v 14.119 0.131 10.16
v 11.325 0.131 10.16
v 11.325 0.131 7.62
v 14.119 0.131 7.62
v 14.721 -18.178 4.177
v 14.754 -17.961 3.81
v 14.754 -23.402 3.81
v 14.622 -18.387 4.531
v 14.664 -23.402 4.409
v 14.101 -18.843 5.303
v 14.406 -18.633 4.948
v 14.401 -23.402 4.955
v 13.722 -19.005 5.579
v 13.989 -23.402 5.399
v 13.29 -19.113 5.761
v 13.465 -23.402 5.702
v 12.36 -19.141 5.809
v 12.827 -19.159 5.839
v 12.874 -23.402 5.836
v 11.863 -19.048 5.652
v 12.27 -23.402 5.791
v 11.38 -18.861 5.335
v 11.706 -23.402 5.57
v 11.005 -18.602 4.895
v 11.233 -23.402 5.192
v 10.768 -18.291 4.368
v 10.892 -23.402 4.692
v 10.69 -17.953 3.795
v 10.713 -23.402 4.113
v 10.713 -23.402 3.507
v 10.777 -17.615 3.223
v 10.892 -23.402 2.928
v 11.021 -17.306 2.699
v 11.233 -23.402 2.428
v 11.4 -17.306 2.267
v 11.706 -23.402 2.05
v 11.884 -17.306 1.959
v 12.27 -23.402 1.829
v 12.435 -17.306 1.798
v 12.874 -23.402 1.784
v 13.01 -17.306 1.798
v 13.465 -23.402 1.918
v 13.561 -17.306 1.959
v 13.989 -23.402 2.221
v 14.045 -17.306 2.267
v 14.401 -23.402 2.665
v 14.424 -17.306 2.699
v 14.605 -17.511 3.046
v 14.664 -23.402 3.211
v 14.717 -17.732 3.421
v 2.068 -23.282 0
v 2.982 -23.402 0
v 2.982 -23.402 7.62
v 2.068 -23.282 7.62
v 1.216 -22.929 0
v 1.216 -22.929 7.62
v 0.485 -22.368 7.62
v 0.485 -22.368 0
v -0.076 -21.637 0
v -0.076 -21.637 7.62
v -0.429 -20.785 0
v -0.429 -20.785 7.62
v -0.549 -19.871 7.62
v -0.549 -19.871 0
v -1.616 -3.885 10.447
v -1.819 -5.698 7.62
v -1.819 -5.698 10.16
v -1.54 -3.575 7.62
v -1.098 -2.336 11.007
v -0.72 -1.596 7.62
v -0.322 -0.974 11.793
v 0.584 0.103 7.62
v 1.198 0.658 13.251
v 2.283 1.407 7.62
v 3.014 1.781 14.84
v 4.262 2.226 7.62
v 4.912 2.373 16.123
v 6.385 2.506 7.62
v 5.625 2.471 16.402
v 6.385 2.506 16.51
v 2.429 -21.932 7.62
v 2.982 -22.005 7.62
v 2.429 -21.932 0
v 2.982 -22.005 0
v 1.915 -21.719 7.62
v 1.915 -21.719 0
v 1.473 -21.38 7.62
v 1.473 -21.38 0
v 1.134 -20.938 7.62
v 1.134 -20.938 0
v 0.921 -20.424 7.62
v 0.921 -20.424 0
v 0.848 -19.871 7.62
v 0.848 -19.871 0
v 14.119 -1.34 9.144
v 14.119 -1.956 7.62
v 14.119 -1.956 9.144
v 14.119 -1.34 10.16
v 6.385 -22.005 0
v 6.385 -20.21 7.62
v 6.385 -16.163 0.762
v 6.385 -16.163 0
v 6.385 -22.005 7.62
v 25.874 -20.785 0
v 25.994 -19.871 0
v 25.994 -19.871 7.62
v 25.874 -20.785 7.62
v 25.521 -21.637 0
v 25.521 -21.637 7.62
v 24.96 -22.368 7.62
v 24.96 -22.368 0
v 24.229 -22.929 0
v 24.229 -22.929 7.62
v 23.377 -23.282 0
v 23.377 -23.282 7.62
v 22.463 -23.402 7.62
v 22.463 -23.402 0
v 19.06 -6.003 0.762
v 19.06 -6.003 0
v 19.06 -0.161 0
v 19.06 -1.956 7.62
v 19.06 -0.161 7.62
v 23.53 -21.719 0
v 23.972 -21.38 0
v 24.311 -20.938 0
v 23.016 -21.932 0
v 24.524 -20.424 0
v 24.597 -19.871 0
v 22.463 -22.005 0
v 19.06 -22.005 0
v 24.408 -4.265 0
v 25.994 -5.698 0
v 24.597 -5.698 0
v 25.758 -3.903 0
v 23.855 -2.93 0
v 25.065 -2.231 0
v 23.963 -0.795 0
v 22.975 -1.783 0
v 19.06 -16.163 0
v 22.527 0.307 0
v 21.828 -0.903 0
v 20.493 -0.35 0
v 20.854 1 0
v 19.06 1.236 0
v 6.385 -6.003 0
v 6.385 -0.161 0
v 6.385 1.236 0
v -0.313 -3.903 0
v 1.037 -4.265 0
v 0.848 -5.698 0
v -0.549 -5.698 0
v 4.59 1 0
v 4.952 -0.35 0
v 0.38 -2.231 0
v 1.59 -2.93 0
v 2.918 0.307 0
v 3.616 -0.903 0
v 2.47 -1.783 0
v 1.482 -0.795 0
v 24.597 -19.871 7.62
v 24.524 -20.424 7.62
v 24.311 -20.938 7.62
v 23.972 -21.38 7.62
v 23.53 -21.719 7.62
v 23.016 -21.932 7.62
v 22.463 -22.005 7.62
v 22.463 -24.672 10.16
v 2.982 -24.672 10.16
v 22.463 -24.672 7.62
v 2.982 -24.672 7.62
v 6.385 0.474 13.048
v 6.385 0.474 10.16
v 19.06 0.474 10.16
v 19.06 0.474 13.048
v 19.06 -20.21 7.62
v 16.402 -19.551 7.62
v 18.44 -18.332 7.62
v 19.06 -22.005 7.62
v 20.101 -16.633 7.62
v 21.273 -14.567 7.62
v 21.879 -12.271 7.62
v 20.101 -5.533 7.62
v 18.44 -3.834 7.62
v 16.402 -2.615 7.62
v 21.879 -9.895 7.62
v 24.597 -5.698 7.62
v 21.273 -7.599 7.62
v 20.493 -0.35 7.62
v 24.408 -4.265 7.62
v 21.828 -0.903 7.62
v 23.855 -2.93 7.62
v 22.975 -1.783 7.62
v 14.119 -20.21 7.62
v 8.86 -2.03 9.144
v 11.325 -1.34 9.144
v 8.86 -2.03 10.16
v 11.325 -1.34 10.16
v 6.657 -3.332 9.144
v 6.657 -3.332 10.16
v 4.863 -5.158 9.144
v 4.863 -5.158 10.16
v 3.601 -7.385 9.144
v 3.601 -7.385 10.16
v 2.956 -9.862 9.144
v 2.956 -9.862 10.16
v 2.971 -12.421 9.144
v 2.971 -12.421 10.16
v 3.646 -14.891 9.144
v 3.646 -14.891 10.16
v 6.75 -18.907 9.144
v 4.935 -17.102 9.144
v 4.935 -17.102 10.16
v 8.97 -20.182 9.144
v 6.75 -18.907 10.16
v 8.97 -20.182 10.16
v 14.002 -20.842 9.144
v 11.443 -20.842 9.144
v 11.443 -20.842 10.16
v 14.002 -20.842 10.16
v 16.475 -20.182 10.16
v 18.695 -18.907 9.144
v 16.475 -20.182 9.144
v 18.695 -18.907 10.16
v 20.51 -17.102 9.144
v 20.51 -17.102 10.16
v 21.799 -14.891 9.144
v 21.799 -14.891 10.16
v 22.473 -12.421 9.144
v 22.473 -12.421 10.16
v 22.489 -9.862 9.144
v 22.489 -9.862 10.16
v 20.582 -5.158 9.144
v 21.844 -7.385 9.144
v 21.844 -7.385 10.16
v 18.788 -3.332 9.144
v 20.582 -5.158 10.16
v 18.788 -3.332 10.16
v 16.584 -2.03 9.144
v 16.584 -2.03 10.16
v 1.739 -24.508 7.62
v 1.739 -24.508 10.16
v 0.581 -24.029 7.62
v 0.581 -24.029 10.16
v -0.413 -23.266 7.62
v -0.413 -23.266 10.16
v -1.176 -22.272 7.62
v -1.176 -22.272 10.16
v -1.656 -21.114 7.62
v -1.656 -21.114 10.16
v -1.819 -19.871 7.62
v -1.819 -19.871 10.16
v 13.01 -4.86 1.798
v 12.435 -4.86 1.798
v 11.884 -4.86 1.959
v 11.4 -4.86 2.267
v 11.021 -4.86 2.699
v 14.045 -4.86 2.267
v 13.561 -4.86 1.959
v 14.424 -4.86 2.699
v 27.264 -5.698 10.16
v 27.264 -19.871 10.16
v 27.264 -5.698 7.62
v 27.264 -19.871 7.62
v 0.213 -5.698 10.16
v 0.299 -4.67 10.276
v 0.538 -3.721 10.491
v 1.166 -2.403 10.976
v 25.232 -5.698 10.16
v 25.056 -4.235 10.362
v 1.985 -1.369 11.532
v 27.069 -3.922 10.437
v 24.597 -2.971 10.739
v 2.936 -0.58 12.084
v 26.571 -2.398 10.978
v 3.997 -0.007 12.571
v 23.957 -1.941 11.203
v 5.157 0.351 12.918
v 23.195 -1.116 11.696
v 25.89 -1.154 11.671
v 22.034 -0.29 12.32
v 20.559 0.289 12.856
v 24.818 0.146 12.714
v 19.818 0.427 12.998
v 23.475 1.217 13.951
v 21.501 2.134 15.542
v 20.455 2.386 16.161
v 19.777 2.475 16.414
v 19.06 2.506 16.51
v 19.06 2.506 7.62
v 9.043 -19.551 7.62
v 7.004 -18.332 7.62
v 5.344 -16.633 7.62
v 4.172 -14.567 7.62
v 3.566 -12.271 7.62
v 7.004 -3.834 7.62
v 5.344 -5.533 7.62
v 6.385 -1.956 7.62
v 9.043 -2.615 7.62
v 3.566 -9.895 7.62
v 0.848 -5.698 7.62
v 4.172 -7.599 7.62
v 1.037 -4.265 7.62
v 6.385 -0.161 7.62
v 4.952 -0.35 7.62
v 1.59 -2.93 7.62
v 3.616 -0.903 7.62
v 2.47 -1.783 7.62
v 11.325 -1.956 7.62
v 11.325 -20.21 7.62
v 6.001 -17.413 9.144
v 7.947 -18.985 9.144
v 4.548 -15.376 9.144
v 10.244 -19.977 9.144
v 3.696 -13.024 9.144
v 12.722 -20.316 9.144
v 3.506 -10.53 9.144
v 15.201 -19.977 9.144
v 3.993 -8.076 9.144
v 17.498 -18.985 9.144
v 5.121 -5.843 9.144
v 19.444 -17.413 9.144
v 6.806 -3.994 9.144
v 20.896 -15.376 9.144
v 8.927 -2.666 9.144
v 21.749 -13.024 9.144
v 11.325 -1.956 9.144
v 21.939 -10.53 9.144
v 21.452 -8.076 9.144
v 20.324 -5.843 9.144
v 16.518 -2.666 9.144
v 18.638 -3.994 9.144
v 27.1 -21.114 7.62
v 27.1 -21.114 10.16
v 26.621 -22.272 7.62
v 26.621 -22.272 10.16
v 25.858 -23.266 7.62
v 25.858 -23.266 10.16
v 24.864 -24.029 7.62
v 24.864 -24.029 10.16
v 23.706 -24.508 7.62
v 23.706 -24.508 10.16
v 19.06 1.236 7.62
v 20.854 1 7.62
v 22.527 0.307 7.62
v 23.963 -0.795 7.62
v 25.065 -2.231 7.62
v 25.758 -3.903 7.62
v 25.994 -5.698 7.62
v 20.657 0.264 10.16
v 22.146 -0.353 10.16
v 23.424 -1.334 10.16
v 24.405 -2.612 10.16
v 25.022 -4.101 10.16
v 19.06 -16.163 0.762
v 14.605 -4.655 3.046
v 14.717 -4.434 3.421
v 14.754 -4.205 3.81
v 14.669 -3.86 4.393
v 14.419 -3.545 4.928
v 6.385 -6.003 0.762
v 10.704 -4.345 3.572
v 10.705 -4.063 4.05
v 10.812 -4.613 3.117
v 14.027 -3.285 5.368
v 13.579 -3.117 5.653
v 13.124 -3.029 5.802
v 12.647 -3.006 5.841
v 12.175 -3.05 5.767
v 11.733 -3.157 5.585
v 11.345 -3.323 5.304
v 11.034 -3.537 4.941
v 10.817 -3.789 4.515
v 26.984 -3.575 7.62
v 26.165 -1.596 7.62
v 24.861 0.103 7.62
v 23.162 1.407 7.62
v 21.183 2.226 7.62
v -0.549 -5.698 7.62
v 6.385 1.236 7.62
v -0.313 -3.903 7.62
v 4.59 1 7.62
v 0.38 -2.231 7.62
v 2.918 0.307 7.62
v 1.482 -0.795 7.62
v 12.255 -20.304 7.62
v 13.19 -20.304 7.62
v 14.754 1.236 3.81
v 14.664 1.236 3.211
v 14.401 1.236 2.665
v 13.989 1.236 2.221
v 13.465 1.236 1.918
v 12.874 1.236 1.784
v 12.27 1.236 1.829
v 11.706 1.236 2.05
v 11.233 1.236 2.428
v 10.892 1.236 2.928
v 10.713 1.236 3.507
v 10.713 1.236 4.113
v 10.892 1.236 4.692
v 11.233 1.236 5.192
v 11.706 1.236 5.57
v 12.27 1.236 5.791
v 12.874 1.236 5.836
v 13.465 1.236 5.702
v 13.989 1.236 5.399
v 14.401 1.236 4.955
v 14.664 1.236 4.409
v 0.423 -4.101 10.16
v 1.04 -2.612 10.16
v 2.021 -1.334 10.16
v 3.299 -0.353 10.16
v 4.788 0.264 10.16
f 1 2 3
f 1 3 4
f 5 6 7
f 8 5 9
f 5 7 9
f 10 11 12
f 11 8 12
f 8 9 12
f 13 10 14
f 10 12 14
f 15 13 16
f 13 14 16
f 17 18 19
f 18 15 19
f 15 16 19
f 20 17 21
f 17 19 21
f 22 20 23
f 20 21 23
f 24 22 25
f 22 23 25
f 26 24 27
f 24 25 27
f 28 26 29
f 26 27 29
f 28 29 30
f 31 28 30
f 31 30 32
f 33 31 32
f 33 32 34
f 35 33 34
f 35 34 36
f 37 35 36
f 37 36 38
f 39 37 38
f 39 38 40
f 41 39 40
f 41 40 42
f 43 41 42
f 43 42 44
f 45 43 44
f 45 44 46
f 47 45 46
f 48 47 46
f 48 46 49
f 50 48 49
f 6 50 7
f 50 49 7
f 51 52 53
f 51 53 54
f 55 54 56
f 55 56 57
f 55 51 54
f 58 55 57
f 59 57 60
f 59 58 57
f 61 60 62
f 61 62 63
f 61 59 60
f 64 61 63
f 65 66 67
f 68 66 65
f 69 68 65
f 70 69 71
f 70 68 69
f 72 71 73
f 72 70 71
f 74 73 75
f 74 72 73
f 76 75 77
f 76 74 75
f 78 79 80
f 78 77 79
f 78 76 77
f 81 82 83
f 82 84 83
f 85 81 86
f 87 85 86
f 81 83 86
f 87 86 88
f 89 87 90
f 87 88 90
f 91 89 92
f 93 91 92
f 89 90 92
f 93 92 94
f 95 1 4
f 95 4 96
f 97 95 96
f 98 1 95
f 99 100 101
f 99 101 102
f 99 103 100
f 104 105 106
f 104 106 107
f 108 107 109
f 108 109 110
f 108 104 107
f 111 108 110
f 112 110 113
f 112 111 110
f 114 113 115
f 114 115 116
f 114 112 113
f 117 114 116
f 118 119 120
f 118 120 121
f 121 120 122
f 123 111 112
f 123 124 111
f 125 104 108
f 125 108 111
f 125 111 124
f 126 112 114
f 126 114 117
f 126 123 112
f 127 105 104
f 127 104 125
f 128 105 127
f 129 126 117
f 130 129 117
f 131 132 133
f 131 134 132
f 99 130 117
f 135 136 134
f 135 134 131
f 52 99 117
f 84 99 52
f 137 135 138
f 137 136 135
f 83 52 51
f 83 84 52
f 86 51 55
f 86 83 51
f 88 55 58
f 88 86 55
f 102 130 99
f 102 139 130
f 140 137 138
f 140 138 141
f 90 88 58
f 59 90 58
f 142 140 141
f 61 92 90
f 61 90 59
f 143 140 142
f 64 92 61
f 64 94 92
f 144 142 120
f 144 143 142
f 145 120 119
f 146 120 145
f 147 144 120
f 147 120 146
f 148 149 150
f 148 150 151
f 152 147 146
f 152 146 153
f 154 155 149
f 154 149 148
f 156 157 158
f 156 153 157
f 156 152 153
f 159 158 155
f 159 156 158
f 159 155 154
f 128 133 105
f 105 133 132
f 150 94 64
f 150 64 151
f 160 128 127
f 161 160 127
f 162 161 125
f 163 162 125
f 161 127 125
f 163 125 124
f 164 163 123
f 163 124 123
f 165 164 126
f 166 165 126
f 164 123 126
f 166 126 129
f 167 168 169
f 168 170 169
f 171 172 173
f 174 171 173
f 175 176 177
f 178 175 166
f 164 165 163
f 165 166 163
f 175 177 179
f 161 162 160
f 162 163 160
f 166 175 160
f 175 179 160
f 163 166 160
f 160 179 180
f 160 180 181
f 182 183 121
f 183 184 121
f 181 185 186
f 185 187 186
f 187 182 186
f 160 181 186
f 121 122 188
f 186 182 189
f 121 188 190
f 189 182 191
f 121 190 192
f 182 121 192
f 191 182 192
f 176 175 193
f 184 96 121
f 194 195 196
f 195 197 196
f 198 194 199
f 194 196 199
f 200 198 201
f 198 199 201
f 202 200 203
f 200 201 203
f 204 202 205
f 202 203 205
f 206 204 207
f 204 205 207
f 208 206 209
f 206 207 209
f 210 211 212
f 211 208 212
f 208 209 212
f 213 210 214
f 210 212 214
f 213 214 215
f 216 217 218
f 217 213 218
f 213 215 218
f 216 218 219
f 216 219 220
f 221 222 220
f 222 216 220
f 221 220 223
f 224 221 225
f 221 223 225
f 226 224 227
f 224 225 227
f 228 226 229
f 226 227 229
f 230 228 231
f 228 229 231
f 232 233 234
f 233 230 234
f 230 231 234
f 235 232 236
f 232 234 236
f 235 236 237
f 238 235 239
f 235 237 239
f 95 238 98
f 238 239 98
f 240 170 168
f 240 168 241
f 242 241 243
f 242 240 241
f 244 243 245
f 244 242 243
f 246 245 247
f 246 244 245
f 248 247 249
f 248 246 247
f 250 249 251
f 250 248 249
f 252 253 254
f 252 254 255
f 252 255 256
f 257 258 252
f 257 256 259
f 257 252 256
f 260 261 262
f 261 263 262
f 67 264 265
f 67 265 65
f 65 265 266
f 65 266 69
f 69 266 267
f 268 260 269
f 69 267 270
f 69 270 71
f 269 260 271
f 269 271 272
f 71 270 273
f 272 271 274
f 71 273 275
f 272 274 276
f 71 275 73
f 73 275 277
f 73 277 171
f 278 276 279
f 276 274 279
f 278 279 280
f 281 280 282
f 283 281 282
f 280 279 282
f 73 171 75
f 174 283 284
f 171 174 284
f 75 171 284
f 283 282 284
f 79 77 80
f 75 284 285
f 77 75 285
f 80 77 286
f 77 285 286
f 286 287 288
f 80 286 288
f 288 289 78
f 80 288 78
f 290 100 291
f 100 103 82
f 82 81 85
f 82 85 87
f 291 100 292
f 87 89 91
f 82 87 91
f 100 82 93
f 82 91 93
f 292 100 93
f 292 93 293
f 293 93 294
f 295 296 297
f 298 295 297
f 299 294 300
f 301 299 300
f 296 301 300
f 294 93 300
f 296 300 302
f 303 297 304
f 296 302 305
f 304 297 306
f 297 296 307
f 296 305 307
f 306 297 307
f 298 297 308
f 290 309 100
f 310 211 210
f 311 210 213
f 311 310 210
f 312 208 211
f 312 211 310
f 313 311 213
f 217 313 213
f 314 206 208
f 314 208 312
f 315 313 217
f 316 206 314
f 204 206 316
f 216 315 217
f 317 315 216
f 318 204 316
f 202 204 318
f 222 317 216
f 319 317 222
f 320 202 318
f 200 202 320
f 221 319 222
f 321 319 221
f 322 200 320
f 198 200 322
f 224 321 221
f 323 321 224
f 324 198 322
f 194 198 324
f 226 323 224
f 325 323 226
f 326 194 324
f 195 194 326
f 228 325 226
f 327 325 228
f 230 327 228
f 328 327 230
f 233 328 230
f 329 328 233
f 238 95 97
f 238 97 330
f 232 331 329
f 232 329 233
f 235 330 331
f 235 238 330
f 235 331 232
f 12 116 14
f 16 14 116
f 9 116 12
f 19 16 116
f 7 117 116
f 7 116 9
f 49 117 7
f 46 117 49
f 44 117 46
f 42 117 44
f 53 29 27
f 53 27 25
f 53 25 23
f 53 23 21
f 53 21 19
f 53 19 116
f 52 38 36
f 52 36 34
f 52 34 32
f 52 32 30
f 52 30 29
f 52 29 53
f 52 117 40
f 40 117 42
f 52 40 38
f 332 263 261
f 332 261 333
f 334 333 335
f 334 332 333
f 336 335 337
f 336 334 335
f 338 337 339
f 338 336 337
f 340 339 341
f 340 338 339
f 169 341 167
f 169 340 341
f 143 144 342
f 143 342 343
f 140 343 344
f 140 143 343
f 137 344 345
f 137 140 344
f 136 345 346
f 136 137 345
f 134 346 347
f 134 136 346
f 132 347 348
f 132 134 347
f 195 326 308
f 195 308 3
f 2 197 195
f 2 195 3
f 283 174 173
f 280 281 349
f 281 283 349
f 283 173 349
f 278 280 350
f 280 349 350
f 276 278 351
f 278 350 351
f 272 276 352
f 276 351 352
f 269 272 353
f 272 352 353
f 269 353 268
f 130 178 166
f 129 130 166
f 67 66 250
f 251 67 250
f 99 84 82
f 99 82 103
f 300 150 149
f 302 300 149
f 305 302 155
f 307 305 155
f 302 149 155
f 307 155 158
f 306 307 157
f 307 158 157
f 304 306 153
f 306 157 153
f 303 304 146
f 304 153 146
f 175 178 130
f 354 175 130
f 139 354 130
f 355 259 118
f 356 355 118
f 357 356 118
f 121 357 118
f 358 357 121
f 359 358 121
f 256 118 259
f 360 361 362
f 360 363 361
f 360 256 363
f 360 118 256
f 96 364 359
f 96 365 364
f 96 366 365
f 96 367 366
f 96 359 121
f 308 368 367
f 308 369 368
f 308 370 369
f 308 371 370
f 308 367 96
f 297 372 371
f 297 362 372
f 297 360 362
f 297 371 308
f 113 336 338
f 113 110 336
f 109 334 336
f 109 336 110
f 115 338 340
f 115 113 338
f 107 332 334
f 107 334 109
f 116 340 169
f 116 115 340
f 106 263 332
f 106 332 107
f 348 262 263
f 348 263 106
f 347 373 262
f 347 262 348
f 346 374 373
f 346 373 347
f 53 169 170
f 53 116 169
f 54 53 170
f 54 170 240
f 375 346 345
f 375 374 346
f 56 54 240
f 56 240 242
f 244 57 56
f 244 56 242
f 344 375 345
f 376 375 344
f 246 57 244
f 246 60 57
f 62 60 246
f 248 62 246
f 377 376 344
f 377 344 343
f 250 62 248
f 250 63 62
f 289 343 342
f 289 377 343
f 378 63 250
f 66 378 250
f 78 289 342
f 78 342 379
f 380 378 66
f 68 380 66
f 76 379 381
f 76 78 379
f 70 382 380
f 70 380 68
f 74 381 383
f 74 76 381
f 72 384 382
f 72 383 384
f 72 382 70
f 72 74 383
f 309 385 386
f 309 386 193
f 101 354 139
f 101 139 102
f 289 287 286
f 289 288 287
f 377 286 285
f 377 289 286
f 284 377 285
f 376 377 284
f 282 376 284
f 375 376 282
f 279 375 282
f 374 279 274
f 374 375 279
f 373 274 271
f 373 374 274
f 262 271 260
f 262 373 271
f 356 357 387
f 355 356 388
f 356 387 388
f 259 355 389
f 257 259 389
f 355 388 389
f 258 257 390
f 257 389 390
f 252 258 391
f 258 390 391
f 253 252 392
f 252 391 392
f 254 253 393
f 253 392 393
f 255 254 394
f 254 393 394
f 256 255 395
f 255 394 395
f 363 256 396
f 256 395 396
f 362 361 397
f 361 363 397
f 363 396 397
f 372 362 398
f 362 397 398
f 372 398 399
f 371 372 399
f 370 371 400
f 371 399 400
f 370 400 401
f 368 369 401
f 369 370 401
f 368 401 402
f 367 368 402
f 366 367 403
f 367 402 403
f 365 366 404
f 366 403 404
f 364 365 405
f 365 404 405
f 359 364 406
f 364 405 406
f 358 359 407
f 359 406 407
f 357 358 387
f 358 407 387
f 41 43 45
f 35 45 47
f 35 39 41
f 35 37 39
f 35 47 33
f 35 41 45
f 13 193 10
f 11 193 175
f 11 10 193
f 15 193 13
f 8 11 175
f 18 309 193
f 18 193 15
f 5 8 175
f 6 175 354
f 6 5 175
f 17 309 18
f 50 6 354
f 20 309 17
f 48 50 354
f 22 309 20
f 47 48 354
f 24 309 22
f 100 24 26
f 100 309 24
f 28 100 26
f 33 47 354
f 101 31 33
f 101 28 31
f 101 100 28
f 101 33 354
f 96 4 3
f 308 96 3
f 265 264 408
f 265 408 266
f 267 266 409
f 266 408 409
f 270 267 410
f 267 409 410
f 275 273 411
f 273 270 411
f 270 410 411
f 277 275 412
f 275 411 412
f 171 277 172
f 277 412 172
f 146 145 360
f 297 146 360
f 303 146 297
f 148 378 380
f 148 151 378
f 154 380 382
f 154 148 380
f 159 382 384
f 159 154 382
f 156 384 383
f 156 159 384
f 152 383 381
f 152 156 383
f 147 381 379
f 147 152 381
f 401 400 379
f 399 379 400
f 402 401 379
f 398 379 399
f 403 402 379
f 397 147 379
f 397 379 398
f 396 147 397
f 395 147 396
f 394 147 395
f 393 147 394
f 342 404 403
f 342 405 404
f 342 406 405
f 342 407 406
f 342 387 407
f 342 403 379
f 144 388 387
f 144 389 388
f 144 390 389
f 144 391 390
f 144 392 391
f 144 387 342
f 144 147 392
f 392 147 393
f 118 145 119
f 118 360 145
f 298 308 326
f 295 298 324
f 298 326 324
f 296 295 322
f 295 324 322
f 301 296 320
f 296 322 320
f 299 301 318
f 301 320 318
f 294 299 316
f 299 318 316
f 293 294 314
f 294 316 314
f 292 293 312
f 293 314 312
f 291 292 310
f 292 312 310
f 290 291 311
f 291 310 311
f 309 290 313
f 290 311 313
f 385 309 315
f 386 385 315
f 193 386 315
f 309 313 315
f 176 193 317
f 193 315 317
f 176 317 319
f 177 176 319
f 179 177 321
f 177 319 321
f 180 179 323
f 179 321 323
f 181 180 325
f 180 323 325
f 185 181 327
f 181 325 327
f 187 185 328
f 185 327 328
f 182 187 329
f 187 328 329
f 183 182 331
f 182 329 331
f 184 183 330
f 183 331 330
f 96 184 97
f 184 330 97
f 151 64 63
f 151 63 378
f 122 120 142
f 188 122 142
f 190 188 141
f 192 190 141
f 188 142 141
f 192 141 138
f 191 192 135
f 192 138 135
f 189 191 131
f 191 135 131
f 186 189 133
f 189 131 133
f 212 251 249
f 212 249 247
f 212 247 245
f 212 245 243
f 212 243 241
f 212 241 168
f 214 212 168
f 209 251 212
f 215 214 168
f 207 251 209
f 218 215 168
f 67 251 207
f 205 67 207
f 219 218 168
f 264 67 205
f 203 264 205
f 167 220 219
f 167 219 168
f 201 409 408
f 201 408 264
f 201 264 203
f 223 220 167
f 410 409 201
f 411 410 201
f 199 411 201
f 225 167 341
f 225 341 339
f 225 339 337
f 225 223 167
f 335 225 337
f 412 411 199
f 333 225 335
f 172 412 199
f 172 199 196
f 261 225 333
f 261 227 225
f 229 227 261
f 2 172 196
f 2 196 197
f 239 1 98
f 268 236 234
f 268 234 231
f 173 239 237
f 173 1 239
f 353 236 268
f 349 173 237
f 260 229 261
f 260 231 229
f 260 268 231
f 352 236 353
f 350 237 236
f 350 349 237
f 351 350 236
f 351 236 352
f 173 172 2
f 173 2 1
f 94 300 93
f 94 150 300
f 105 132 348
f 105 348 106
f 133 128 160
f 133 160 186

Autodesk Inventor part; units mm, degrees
ref_plane "XZ Plane" through (0, 0, 0) normal (0, 1, 0) x (-1, 0, 0)
ref_plane "XY Plane" through (0, 0, 0) normal (0, 0, 1) x (1, 0, 0)
sketch "Sketch2" plane through (0, 0, 0) normal (0, 0, 1) x (1, 0, 0)
  line L0 (25.1049, -5.6982) -> (25.1049, -19.8714) projected
  arc A0 (22.4633, -22.513) -> (25.1049, -19.8714) centre (22.4633, -19.8714) ccw projected
  line L1 (22.4633, -22.513) -> (2.9815, -22.513) projected
  arc A1 (0.3399, -19.8714) -> (2.9815, -22.513) centre (2.9815, -19.8714) ccw projected
  line L2 (0.3399, -19.8714) -> (0.3399, -5.6982) projected
  arc A2 (6.3851, 0.347) -> (0.3399, -5.6982) centre (6.3851, -5.6982) ccw projected
  line L3 (6.3851, 0.347) -> (19.0597, 0.347) projected
  arc A3 (25.1049, -5.6982) -> (19.0597, 0.347) centre (19.0597, -5.6982) ccw projected
  line L4 (19.0597, 2.506) -> (6.3851, 2.506) projected
  arc A4 (6.3851, 2.506) -> (-1.8191, -5.6982) centre (6.3851, -5.6982) ccw projected
  line L5 (-1.8191, -5.6982) -> (-1.8191, -19.8714) projected
  arc A5 (-1.8191, -19.8714) -> (2.9815, -24.672) centre (2.9815, -19.8714) ccw projected
  line L6 (2.9815, -24.672) -> (22.4633, -24.672) projected
  arc A6 (22.4633, -24.672) -> (27.2639, -19.8714) centre (22.4633, -19.8714) ccw projected
  line L7 (27.2639, -19.8714) -> (27.2639, -5.6982) projected
  arc A7 (27.2639, -5.6982) -> (19.0597, 2.506) centre (19.0597, -5.6982) ccw projected
  line L8 (19.0597, -0.923) -> (6.3851, -0.923)
  arc A8 (6.3851, -0.923) -> (1.6099, -5.6982) centre (6.3851, -5.6982) ccw
  line L9 (1.6099, -5.6982) -> (1.6099, -19.8714)
  arc A9 (1.6099, -19.8714) -> (2.9815, -21.243) centre (2.9815, -19.8714) ccw
  line L10 (2.9815, -21.243) -> (22.4633, -21.243)
  arc A10 (22.4633, -21.243) -> (23.8349, -19.8714) centre (22.4633, -19.8714) ccw
  line L11 (23.8349, -19.8714) -> (23.8349, -5.6982)
  arc A11 (23.8349, -5.6982) -> (19.0597, -0.923) centre (19.0597, -5.6982) ccw
  point P0 (0, 0)
  dimension "d30" = 1.27
extrude "Extrusion1" add sketch "Sketch2" along normal blind 10.16 contours A7 L7 A6 L6 A5 L5 A4 L4
sketch "Sketch6" plane through (0, 0, 10.16) normal (0, 0, 1) x (1, 0, 0)
  arc A0 (22.4633, -22.513) -> (25.1049, -19.8714) centre (22.4633, -19.8714) ccw projected
  line L0 (22.4633, -22.513) -> (2.9815, -22.513) projected
  arc A1 (0.3399, -19.8714) -> (2.9815, -22.513) centre (2.9815, -19.8714) ccw projected
  line L1 (0.3399, -19.8714) -> (0.3399, -5.6982) projected
  arc A2 (6.3851, 0.347) -> (0.3399, -5.6982) centre (6.3851, -5.6982) ccw projected
  line L2 (6.3851, 0.347) -> (19.0597, 0.347) projected
  arc A3 (25.1049, -5.6982) -> (19.0597, 0.347) centre (19.0597, -5.6982) ccw projected
  line L3 (25.1049, -5.6982) -> (25.1049, -19.8714) projected
  line L4 (19.0597, 2.506) -> (6.3851, 2.506) projected
  arc A4 (6.3851, 2.506) -> (-1.8191, -5.6982) centre (6.3851, -5.6982) ccw projected
  line L5 (-1.8191, -5.6982) -> (-1.8191, -19.8714) projected
  arc A5 (-1.8191, -19.8714) -> (2.9815, -24.672) centre (2.9815, -19.8714) ccw projected
  line L6 (2.9815, -24.672) -> (22.4633, -24.672) projected
  arc A6 (22.4633, -24.672) -> (27.2639, -19.8714) centre (22.4633, -19.8714) ccw projected
  line L7 (27.2639, -19.8714) -> (27.2639, -5.6982) projected
  arc A7 (27.2639, -5.6982) -> (19.0597, 2.506) centre (19.0597, -5.6982) ccw projected
  point P0 (0, 0)
extrude "Extrusion2" add sketch "Sketch6" against normal blind 2.54 contours L0 A1 L1 A2 L2 A3 L3 A0
sketch "Sketch7" plane through (0, 0, 10.16) normal (0, 0, 1) x (1, 0, 0)
  circle A0 centre (12.7224, -11.083) radius 9.2329
  line L0 (27.2639, -19.8714) -> (27.2639, -5.6982) construction
  line L1 (19.0597, 2.506) -> (6.3851, 2.506) construction
  line L2 (2.9815, -24.672) -> (22.4633, -24.672) construction
  line L3 (-1.8191, -5.6982) -> (-1.8191, -19.8714) construction
  line L4 (10.7523, 2.506) -> (10.7523, -24.672) construction
  line L5 (-1.8191, -7.0342) -> (27.2639, -7.0342) construction
  point P0 (0, 0)
  point P1 (12.7224, -7.0342)
  point P2 (10.7523, -11.083)
  dimension "d8" = 18.4658
extrude "Extrusion3" cut sketch "Sketch7" against normal up to next
sketch "Sketch8" plane through (0, 0, 10.16) normal (0, 0, 1) x (1, 0, 0)
  circle A0 centre (12.7224, -11.083) radius 9.2329 projected
  circle A1 centre (12.7224, -11.083) radius 9.8425
  point P0 (0, 0)
  dimension "d16" = 19.685
extrude "Extrusion4" cut sketch "Sketch8" against normal blind 1.016
sketch "Sketch9" plane through (0, 0, 10.16) normal (0, 0, 1) x (1, 0, 0)
  line L0 (11.3254, 0.1311) -> (14.1194, 0.1311)
  line L1 (14.1194, 0.1311) -> (14.1194, -3.581)
  line L2 (14.1194, -3.581) -> (11.3254, -3.581)
  line L3 (11.3254, -3.581) -> (11.3254, 0.1311)
  circle A0 centre (12.7224, -11.083) radius 9.8425 projected
  line L4 (15.693, -1.2405) -> (10.0356, -1.2405) construction
  point P0 (0, 0)
  point P1 (12.7224, 0.1311)
  dimension "d19" = 2.794
  dimension "d21" = 1.3716
extrude "Extrusion5" cut sketch "Sketch9" against normal blind 3.175 contours L0 L1 A0 L3 | A0 L1 L2 L3 picked at (12.5667, -2.8045)
sketch "Sketch10" plane through (6.3851, 0.347, 0) normal (0, -1, 0) x (1, 0, 0)
  line L0 (12.6746, 7.62) -> (0, 7.62) projected
  line L1 (0, 0) -> (0, 7.62) projected
  line L2 (12.6746, 0) -> (0, 0) projected
  line L3 (12.6746, 0) -> (12.6746, 7.62) projected
  point P0 (-6.3851, 0)
extrude "Extrusion6" add sketch "Sketch10" along normal blind 6.35
sketch "Sketch11" plane through (6.3851, -6.003, 0) normal (-1, 0, 0) x (0, 0, 1)
  line L0 (8.0792, 4.1021) -> (0.254, -0.4699)
  line L1 (7.62, 1.6345) -> (7.62, 4.0466) projected
  line L2 (7.62, 1.6345) -> (7.62, 0) projected
  line L3 (7.62, 0) -> (7.62, 4.064)
  line L4 (7.62, 0) -> (0.762, 0)
  line L5 (0, 0) -> (7.62, 0) projected
  line L6 (7.62, 4.0466) -> (9.144, 4.0466) projected
  line L7 (0.762, 0) -> (7.62, 4.0466)
  point P0 (0, 6.003)
  dimension "d26" = 4.064
  dimension "d27" = 6.858
extrude "Extrusion7" cut sketch "Sketch11" against normal up to surface (12.6746 mm away) contours L1 L2 L4 L0 | L0 L4 L7 L1
ref_plane "Work Plane2" through (2.9815, -11.083, 0) normal (0, -1, 0) x (1, 0, 0)
mirror "Mirror1" about plane through (2.9815, -11.083, 0) normal (0, -1, 0) of "Extrusion6", "Extrusion7"
sketch "Sketch13" plane through (0, 0, 0) normal (0, 0, -1) x (-1, 0, 0)
  line L0 (-25.1049, -5.6982) -> (-25.1049, -19.8714) projected
  arc A0 (-25.1049, -19.8714) -> (-22.4633, -22.513) centre (-22.4633, -19.8714) ccw projected
  line L1 (-22.4633, -22.513) -> (-2.9815, -22.513) projected
  arc A1 (-2.9815, -22.513) -> (-0.3399, -19.8714) centre (-2.9815, -19.8714) ccw projected
  line L2 (-0.3399, -19.8714) -> (-0.3399, -5.6982) projected
  arc A2 (-0.3399, -5.6982) -> (-6.3851, 0.347) centre (-6.3851, -5.6982) ccw projected
  line L3 (-6.3851, 0.347) -> (-19.0597, 0.347) projected
  arc A3 (-19.0597, 0.347) -> (-25.1049, -5.6982) centre (-19.0597, -5.6982) ccw projected
  line L4 (-19.0597, 2.506) -> (-6.3851, 2.506) projected
  arc A4 (1.8191, -5.6982) -> (-6.3851, 2.506) centre (-6.3851, -5.6982) ccw projected
  line L5 (1.8191, -5.6982) -> (1.8191, -19.8714) projected
  arc A5 (-2.9815, -24.672) -> (1.8191, -19.8714) centre (-2.9815, -19.8714) ccw projected
  line L6 (-2.9815, -24.672) -> (-22.4633, -24.672) projected
  arc A6 (-27.2639, -19.8714) -> (-22.4633, -24.672) centre (-22.4633, -19.8714) ccw projected
  line L7 (-27.2639, -19.8714) -> (-27.2639, -5.6982) projected
  arc A7 (-19.0597, 2.506) -> (-27.2639, -5.6982) centre (-19.0597, -5.6982) ccw projected
  line L8 (-19.0597, -0.161) -> (-6.3851, -0.161)
  arc A8 (-0.8479, -5.6982) -> (-6.3851, -0.161) centre (-6.3851, -5.6982) ccw
  line L9 (-0.8479, -5.6982) -> (-0.8479, -19.8714)
  arc A9 (-2.9815, -22.005) -> (-0.8479, -19.8714) centre (-2.9815, -19.8714) ccw
  line L10 (-2.9815, -22.005) -> (-22.4633, -22.005)
  arc A10 (-24.5969, -19.8714) -> (-22.4633, -22.005) centre (-22.4633, -19.8714) ccw
  line L11 (-24.5969, -19.8714) -> (-24.5969, -5.6982)
  arc A11 (-19.0597, -0.161) -> (-24.5969, -5.6982) centre (-19.0597, -5.6982) ccw
  point P0 (0, 0)
  dimension "d32" = 0.508
extrude "Extrusion8" add sketch "Sketch13" against normal up to surface (7.62 mm away) contours A3 L3 A2 L2 A1 L1 A0 L0
sketch "Sketch14" plane through (0, 0, 10.16) normal (0, 0, 1) x (1, 0, 0)
  line L0 (19.0597, 2.506) -> (6.3851, 2.506) projected
  arc A0 (6.3851, 2.506) -> (-1.8191, -5.6982) centre (6.3851, -5.6982) ccw projected
  line L1 (-1.8191, -5.6982) -> (-1.8191, -19.8714) projected
  arc A1 (-1.8191, -19.8714) -> (2.9815, -24.672) centre (2.9815, -19.8714) ccw projected
  line L2 (2.9815, -24.672) -> (22.4633, -24.672) projected
  arc A2 (22.4633, -24.672) -> (27.2639, -19.8714) centre (22.4633, -19.8714) ccw projected
  line L3 (27.2639, -19.8714) -> (27.2639, -5.6982) projected
  arc A3 (27.2639, -5.6982) -> (19.0597, 2.506) centre (19.0597, -5.6982) ccw projected
  line L4 (11.3254, -1.3402) -> (11.3254, 0.1311) projected
  line L5 (11.3254, 0.1311) -> (14.1194, 0.1311) projected
  line L6 (14.1194, 0.1311) -> (14.1194, -1.3402) projected
  arc A4 (11.3254, -1.3402) -> (14.1194, -1.3402) centre (12.7224, -11.083) ccw projected
  line L7 (6.3851, 0.474) -> (19.0597, 0.474)
  arc A5 (25.2319, -5.6982) -> (19.0597, 0.474) centre (19.0597, -5.6982) ccw
  line L8 (25.2319, -5.6982) -> (25.2319, -19.8714)
  arc A6 (22.4633, -22.64) -> (25.2319, -19.8714) centre (22.4633, -19.8714) ccw
  line L9 (22.4633, -22.64) -> (2.9815, -22.64)
  arc A7 (0.2129, -19.8714) -> (2.9815, -22.64) centre (2.9815, -19.8714) ccw
  line L10 (0.2129, -19.8714) -> (0.2129, -5.6982)
  arc A8 (6.3851, 0.474) -> (0.2129, -5.6982) centre (6.3851, -5.6982) ccw
  arc A9 (27.2639, -5.6982) -> (19.0597, 2.506) centre (19.0597, -5.6982) ccw projected
  line L11 (27.2639, -19.8714) -> (27.2639, -5.6982) projected
  line L12 (27.2639, -5.6982) -> (25.2319, -5.6982)
  line L13 (0.2129, -5.6982) -> (-1.8191, -5.6982)
  point P0 (0, 0)
  dimension "d35" = 2.032
extrude "Extrusion9" add sketch "Sketch14" along normal blind 6.35 contours A3 L12 A5 L7 A8 L13 A0 L0
sketch "Sketch15" plane through (27.2639, -19.8714, 0) normal (1, 0, 0) x (0, 0, -1)
  line L0 (-10.16, 14.1732) -> (-16.51, 14.1732) projected
  line L1 (-16.51, 22.3774) -> (-16.51, 14.1732) projected
  arc A0 (-10.16, 14.1732) -> (-16.51, 22.3774) centre (-19.3004, 13.6582) ccw
  line L2 (-10.16, 14.1732) -> (-16.51, 14.1732) projected
  point P0 (0, 19.8714)
extrude "Extrusion10" cut sketch "Sketch15" against normal through all
sketch "Sketch16" plane through (0, 0, 0) normal (0, 0, -1) x (-1, 0, 0)
  line L0 (-25.1049, -5.6982) -> (-25.1049, -19.8714) projected
  arc A0 (-25.1049, -19.8714) -> (-22.4633, -22.513) centre (-22.4633, -19.8714) ccw projected
  line L1 (-22.4633, -22.513) -> (-2.9815, -22.513) projected
  arc A1 (-2.9815, -22.513) -> (-0.3399, -19.8714) centre (-2.9815, -19.8714) ccw projected
  line L2 (-0.3399, -19.8714) -> (-0.3399, -5.6982) projected
  arc A2 (-0.3399, -5.6982) -> (-6.3851, 0.347) centre (-6.3851, -5.6982) ccw projected
  line L3 (-6.3851, 0.347) -> (-19.0597, 0.347) projected
  arc A3 (-19.0597, 0.347) -> (-25.1049, -5.6982) centre (-19.0597, -5.6982) ccw projected
  line L4 (-19.0597, 2.506) -> (-6.3851, 2.506) projected
  arc A4 (1.8191, -5.6982) -> (-6.3851, 2.506) centre (-6.3851, -5.6982) ccw projected
  line L5 (1.8191, -5.6982) -> (1.8191, -19.8714) projected
  arc A5 (-2.9815, -24.672) -> (1.8191, -19.8714) centre (-2.9815, -19.8714) ccw projected
  line L6 (-2.9815, -24.672) -> (-22.4633, -24.672) projected
  arc A6 (-27.2639, -19.8714) -> (-22.4633, -24.672) centre (-22.4633, -19.8714) ccw projected
  line L7 (-27.2639, -19.8714) -> (-27.2639, -5.6982) projected
  arc A7 (-19.0597, 2.506) -> (-27.2639, -5.6982) centre (-19.0597, -5.6982) ccw projected
  line L8 (-25.9939, -5.6982) -> (-25.9939, -19.8714)
  arc A8 (-25.9939, -19.8714) -> (-22.4633, -23.402) centre (-22.4633, -19.8714) ccw
  line L9 (-22.4633, -23.402) -> (-2.9815, -23.402)
  arc A9 (-2.9815, -23.402) -> (0.5491, -19.8714) centre (-2.9815, -19.8714) ccw
  line L10 (0.5491, -19.8714) -> (0.5491, -5.6982)
  arc A10 (0.5491, -5.6982) -> (-6.3851, 1.236) centre (-6.3851, -5.6982) ccw
  line L11 (-6.3851, 1.236) -> (-19.0597, 1.236)
  arc A11 (-19.0597, 1.236) -> (-25.9939, -5.6982) centre (-19.0597, -5.6982) ccw
  point P0 (0, 0)
  dimension "d40" = 1.27
extrude "Extrusion11" cut sketch "Sketch16" against normal blind 7.62 contours L4 A4 L5 A5 L6 A6 L7 A7
sketch "Sketch17" plane through (6.3851, 1.236, 0) normal (0, 1, 0) x (1, 0, 0)
  circle A0 centre (6.3373, -3.81) radius 2.032
  line L0 (12.6746, -7.62) -> (0, -7.62) projected
  line L1 (0, 0) -> (0, -7.62) projected
  point P0 (-6.3851, 0)
  point P1 (6.3373, -7.62)
  point P2 (0, -3.81)
  dimension "d43" = 4.064
  dimension "d44" = 3.81
extrude "Extrusion12" cut sketch "Sketch17" against normal blind 6.096
mirror "Mirror2" about plane through (2.9815, -11.083, 0) normal (0, -1, 0) of "Extrusion12"
properties part number "Front"
